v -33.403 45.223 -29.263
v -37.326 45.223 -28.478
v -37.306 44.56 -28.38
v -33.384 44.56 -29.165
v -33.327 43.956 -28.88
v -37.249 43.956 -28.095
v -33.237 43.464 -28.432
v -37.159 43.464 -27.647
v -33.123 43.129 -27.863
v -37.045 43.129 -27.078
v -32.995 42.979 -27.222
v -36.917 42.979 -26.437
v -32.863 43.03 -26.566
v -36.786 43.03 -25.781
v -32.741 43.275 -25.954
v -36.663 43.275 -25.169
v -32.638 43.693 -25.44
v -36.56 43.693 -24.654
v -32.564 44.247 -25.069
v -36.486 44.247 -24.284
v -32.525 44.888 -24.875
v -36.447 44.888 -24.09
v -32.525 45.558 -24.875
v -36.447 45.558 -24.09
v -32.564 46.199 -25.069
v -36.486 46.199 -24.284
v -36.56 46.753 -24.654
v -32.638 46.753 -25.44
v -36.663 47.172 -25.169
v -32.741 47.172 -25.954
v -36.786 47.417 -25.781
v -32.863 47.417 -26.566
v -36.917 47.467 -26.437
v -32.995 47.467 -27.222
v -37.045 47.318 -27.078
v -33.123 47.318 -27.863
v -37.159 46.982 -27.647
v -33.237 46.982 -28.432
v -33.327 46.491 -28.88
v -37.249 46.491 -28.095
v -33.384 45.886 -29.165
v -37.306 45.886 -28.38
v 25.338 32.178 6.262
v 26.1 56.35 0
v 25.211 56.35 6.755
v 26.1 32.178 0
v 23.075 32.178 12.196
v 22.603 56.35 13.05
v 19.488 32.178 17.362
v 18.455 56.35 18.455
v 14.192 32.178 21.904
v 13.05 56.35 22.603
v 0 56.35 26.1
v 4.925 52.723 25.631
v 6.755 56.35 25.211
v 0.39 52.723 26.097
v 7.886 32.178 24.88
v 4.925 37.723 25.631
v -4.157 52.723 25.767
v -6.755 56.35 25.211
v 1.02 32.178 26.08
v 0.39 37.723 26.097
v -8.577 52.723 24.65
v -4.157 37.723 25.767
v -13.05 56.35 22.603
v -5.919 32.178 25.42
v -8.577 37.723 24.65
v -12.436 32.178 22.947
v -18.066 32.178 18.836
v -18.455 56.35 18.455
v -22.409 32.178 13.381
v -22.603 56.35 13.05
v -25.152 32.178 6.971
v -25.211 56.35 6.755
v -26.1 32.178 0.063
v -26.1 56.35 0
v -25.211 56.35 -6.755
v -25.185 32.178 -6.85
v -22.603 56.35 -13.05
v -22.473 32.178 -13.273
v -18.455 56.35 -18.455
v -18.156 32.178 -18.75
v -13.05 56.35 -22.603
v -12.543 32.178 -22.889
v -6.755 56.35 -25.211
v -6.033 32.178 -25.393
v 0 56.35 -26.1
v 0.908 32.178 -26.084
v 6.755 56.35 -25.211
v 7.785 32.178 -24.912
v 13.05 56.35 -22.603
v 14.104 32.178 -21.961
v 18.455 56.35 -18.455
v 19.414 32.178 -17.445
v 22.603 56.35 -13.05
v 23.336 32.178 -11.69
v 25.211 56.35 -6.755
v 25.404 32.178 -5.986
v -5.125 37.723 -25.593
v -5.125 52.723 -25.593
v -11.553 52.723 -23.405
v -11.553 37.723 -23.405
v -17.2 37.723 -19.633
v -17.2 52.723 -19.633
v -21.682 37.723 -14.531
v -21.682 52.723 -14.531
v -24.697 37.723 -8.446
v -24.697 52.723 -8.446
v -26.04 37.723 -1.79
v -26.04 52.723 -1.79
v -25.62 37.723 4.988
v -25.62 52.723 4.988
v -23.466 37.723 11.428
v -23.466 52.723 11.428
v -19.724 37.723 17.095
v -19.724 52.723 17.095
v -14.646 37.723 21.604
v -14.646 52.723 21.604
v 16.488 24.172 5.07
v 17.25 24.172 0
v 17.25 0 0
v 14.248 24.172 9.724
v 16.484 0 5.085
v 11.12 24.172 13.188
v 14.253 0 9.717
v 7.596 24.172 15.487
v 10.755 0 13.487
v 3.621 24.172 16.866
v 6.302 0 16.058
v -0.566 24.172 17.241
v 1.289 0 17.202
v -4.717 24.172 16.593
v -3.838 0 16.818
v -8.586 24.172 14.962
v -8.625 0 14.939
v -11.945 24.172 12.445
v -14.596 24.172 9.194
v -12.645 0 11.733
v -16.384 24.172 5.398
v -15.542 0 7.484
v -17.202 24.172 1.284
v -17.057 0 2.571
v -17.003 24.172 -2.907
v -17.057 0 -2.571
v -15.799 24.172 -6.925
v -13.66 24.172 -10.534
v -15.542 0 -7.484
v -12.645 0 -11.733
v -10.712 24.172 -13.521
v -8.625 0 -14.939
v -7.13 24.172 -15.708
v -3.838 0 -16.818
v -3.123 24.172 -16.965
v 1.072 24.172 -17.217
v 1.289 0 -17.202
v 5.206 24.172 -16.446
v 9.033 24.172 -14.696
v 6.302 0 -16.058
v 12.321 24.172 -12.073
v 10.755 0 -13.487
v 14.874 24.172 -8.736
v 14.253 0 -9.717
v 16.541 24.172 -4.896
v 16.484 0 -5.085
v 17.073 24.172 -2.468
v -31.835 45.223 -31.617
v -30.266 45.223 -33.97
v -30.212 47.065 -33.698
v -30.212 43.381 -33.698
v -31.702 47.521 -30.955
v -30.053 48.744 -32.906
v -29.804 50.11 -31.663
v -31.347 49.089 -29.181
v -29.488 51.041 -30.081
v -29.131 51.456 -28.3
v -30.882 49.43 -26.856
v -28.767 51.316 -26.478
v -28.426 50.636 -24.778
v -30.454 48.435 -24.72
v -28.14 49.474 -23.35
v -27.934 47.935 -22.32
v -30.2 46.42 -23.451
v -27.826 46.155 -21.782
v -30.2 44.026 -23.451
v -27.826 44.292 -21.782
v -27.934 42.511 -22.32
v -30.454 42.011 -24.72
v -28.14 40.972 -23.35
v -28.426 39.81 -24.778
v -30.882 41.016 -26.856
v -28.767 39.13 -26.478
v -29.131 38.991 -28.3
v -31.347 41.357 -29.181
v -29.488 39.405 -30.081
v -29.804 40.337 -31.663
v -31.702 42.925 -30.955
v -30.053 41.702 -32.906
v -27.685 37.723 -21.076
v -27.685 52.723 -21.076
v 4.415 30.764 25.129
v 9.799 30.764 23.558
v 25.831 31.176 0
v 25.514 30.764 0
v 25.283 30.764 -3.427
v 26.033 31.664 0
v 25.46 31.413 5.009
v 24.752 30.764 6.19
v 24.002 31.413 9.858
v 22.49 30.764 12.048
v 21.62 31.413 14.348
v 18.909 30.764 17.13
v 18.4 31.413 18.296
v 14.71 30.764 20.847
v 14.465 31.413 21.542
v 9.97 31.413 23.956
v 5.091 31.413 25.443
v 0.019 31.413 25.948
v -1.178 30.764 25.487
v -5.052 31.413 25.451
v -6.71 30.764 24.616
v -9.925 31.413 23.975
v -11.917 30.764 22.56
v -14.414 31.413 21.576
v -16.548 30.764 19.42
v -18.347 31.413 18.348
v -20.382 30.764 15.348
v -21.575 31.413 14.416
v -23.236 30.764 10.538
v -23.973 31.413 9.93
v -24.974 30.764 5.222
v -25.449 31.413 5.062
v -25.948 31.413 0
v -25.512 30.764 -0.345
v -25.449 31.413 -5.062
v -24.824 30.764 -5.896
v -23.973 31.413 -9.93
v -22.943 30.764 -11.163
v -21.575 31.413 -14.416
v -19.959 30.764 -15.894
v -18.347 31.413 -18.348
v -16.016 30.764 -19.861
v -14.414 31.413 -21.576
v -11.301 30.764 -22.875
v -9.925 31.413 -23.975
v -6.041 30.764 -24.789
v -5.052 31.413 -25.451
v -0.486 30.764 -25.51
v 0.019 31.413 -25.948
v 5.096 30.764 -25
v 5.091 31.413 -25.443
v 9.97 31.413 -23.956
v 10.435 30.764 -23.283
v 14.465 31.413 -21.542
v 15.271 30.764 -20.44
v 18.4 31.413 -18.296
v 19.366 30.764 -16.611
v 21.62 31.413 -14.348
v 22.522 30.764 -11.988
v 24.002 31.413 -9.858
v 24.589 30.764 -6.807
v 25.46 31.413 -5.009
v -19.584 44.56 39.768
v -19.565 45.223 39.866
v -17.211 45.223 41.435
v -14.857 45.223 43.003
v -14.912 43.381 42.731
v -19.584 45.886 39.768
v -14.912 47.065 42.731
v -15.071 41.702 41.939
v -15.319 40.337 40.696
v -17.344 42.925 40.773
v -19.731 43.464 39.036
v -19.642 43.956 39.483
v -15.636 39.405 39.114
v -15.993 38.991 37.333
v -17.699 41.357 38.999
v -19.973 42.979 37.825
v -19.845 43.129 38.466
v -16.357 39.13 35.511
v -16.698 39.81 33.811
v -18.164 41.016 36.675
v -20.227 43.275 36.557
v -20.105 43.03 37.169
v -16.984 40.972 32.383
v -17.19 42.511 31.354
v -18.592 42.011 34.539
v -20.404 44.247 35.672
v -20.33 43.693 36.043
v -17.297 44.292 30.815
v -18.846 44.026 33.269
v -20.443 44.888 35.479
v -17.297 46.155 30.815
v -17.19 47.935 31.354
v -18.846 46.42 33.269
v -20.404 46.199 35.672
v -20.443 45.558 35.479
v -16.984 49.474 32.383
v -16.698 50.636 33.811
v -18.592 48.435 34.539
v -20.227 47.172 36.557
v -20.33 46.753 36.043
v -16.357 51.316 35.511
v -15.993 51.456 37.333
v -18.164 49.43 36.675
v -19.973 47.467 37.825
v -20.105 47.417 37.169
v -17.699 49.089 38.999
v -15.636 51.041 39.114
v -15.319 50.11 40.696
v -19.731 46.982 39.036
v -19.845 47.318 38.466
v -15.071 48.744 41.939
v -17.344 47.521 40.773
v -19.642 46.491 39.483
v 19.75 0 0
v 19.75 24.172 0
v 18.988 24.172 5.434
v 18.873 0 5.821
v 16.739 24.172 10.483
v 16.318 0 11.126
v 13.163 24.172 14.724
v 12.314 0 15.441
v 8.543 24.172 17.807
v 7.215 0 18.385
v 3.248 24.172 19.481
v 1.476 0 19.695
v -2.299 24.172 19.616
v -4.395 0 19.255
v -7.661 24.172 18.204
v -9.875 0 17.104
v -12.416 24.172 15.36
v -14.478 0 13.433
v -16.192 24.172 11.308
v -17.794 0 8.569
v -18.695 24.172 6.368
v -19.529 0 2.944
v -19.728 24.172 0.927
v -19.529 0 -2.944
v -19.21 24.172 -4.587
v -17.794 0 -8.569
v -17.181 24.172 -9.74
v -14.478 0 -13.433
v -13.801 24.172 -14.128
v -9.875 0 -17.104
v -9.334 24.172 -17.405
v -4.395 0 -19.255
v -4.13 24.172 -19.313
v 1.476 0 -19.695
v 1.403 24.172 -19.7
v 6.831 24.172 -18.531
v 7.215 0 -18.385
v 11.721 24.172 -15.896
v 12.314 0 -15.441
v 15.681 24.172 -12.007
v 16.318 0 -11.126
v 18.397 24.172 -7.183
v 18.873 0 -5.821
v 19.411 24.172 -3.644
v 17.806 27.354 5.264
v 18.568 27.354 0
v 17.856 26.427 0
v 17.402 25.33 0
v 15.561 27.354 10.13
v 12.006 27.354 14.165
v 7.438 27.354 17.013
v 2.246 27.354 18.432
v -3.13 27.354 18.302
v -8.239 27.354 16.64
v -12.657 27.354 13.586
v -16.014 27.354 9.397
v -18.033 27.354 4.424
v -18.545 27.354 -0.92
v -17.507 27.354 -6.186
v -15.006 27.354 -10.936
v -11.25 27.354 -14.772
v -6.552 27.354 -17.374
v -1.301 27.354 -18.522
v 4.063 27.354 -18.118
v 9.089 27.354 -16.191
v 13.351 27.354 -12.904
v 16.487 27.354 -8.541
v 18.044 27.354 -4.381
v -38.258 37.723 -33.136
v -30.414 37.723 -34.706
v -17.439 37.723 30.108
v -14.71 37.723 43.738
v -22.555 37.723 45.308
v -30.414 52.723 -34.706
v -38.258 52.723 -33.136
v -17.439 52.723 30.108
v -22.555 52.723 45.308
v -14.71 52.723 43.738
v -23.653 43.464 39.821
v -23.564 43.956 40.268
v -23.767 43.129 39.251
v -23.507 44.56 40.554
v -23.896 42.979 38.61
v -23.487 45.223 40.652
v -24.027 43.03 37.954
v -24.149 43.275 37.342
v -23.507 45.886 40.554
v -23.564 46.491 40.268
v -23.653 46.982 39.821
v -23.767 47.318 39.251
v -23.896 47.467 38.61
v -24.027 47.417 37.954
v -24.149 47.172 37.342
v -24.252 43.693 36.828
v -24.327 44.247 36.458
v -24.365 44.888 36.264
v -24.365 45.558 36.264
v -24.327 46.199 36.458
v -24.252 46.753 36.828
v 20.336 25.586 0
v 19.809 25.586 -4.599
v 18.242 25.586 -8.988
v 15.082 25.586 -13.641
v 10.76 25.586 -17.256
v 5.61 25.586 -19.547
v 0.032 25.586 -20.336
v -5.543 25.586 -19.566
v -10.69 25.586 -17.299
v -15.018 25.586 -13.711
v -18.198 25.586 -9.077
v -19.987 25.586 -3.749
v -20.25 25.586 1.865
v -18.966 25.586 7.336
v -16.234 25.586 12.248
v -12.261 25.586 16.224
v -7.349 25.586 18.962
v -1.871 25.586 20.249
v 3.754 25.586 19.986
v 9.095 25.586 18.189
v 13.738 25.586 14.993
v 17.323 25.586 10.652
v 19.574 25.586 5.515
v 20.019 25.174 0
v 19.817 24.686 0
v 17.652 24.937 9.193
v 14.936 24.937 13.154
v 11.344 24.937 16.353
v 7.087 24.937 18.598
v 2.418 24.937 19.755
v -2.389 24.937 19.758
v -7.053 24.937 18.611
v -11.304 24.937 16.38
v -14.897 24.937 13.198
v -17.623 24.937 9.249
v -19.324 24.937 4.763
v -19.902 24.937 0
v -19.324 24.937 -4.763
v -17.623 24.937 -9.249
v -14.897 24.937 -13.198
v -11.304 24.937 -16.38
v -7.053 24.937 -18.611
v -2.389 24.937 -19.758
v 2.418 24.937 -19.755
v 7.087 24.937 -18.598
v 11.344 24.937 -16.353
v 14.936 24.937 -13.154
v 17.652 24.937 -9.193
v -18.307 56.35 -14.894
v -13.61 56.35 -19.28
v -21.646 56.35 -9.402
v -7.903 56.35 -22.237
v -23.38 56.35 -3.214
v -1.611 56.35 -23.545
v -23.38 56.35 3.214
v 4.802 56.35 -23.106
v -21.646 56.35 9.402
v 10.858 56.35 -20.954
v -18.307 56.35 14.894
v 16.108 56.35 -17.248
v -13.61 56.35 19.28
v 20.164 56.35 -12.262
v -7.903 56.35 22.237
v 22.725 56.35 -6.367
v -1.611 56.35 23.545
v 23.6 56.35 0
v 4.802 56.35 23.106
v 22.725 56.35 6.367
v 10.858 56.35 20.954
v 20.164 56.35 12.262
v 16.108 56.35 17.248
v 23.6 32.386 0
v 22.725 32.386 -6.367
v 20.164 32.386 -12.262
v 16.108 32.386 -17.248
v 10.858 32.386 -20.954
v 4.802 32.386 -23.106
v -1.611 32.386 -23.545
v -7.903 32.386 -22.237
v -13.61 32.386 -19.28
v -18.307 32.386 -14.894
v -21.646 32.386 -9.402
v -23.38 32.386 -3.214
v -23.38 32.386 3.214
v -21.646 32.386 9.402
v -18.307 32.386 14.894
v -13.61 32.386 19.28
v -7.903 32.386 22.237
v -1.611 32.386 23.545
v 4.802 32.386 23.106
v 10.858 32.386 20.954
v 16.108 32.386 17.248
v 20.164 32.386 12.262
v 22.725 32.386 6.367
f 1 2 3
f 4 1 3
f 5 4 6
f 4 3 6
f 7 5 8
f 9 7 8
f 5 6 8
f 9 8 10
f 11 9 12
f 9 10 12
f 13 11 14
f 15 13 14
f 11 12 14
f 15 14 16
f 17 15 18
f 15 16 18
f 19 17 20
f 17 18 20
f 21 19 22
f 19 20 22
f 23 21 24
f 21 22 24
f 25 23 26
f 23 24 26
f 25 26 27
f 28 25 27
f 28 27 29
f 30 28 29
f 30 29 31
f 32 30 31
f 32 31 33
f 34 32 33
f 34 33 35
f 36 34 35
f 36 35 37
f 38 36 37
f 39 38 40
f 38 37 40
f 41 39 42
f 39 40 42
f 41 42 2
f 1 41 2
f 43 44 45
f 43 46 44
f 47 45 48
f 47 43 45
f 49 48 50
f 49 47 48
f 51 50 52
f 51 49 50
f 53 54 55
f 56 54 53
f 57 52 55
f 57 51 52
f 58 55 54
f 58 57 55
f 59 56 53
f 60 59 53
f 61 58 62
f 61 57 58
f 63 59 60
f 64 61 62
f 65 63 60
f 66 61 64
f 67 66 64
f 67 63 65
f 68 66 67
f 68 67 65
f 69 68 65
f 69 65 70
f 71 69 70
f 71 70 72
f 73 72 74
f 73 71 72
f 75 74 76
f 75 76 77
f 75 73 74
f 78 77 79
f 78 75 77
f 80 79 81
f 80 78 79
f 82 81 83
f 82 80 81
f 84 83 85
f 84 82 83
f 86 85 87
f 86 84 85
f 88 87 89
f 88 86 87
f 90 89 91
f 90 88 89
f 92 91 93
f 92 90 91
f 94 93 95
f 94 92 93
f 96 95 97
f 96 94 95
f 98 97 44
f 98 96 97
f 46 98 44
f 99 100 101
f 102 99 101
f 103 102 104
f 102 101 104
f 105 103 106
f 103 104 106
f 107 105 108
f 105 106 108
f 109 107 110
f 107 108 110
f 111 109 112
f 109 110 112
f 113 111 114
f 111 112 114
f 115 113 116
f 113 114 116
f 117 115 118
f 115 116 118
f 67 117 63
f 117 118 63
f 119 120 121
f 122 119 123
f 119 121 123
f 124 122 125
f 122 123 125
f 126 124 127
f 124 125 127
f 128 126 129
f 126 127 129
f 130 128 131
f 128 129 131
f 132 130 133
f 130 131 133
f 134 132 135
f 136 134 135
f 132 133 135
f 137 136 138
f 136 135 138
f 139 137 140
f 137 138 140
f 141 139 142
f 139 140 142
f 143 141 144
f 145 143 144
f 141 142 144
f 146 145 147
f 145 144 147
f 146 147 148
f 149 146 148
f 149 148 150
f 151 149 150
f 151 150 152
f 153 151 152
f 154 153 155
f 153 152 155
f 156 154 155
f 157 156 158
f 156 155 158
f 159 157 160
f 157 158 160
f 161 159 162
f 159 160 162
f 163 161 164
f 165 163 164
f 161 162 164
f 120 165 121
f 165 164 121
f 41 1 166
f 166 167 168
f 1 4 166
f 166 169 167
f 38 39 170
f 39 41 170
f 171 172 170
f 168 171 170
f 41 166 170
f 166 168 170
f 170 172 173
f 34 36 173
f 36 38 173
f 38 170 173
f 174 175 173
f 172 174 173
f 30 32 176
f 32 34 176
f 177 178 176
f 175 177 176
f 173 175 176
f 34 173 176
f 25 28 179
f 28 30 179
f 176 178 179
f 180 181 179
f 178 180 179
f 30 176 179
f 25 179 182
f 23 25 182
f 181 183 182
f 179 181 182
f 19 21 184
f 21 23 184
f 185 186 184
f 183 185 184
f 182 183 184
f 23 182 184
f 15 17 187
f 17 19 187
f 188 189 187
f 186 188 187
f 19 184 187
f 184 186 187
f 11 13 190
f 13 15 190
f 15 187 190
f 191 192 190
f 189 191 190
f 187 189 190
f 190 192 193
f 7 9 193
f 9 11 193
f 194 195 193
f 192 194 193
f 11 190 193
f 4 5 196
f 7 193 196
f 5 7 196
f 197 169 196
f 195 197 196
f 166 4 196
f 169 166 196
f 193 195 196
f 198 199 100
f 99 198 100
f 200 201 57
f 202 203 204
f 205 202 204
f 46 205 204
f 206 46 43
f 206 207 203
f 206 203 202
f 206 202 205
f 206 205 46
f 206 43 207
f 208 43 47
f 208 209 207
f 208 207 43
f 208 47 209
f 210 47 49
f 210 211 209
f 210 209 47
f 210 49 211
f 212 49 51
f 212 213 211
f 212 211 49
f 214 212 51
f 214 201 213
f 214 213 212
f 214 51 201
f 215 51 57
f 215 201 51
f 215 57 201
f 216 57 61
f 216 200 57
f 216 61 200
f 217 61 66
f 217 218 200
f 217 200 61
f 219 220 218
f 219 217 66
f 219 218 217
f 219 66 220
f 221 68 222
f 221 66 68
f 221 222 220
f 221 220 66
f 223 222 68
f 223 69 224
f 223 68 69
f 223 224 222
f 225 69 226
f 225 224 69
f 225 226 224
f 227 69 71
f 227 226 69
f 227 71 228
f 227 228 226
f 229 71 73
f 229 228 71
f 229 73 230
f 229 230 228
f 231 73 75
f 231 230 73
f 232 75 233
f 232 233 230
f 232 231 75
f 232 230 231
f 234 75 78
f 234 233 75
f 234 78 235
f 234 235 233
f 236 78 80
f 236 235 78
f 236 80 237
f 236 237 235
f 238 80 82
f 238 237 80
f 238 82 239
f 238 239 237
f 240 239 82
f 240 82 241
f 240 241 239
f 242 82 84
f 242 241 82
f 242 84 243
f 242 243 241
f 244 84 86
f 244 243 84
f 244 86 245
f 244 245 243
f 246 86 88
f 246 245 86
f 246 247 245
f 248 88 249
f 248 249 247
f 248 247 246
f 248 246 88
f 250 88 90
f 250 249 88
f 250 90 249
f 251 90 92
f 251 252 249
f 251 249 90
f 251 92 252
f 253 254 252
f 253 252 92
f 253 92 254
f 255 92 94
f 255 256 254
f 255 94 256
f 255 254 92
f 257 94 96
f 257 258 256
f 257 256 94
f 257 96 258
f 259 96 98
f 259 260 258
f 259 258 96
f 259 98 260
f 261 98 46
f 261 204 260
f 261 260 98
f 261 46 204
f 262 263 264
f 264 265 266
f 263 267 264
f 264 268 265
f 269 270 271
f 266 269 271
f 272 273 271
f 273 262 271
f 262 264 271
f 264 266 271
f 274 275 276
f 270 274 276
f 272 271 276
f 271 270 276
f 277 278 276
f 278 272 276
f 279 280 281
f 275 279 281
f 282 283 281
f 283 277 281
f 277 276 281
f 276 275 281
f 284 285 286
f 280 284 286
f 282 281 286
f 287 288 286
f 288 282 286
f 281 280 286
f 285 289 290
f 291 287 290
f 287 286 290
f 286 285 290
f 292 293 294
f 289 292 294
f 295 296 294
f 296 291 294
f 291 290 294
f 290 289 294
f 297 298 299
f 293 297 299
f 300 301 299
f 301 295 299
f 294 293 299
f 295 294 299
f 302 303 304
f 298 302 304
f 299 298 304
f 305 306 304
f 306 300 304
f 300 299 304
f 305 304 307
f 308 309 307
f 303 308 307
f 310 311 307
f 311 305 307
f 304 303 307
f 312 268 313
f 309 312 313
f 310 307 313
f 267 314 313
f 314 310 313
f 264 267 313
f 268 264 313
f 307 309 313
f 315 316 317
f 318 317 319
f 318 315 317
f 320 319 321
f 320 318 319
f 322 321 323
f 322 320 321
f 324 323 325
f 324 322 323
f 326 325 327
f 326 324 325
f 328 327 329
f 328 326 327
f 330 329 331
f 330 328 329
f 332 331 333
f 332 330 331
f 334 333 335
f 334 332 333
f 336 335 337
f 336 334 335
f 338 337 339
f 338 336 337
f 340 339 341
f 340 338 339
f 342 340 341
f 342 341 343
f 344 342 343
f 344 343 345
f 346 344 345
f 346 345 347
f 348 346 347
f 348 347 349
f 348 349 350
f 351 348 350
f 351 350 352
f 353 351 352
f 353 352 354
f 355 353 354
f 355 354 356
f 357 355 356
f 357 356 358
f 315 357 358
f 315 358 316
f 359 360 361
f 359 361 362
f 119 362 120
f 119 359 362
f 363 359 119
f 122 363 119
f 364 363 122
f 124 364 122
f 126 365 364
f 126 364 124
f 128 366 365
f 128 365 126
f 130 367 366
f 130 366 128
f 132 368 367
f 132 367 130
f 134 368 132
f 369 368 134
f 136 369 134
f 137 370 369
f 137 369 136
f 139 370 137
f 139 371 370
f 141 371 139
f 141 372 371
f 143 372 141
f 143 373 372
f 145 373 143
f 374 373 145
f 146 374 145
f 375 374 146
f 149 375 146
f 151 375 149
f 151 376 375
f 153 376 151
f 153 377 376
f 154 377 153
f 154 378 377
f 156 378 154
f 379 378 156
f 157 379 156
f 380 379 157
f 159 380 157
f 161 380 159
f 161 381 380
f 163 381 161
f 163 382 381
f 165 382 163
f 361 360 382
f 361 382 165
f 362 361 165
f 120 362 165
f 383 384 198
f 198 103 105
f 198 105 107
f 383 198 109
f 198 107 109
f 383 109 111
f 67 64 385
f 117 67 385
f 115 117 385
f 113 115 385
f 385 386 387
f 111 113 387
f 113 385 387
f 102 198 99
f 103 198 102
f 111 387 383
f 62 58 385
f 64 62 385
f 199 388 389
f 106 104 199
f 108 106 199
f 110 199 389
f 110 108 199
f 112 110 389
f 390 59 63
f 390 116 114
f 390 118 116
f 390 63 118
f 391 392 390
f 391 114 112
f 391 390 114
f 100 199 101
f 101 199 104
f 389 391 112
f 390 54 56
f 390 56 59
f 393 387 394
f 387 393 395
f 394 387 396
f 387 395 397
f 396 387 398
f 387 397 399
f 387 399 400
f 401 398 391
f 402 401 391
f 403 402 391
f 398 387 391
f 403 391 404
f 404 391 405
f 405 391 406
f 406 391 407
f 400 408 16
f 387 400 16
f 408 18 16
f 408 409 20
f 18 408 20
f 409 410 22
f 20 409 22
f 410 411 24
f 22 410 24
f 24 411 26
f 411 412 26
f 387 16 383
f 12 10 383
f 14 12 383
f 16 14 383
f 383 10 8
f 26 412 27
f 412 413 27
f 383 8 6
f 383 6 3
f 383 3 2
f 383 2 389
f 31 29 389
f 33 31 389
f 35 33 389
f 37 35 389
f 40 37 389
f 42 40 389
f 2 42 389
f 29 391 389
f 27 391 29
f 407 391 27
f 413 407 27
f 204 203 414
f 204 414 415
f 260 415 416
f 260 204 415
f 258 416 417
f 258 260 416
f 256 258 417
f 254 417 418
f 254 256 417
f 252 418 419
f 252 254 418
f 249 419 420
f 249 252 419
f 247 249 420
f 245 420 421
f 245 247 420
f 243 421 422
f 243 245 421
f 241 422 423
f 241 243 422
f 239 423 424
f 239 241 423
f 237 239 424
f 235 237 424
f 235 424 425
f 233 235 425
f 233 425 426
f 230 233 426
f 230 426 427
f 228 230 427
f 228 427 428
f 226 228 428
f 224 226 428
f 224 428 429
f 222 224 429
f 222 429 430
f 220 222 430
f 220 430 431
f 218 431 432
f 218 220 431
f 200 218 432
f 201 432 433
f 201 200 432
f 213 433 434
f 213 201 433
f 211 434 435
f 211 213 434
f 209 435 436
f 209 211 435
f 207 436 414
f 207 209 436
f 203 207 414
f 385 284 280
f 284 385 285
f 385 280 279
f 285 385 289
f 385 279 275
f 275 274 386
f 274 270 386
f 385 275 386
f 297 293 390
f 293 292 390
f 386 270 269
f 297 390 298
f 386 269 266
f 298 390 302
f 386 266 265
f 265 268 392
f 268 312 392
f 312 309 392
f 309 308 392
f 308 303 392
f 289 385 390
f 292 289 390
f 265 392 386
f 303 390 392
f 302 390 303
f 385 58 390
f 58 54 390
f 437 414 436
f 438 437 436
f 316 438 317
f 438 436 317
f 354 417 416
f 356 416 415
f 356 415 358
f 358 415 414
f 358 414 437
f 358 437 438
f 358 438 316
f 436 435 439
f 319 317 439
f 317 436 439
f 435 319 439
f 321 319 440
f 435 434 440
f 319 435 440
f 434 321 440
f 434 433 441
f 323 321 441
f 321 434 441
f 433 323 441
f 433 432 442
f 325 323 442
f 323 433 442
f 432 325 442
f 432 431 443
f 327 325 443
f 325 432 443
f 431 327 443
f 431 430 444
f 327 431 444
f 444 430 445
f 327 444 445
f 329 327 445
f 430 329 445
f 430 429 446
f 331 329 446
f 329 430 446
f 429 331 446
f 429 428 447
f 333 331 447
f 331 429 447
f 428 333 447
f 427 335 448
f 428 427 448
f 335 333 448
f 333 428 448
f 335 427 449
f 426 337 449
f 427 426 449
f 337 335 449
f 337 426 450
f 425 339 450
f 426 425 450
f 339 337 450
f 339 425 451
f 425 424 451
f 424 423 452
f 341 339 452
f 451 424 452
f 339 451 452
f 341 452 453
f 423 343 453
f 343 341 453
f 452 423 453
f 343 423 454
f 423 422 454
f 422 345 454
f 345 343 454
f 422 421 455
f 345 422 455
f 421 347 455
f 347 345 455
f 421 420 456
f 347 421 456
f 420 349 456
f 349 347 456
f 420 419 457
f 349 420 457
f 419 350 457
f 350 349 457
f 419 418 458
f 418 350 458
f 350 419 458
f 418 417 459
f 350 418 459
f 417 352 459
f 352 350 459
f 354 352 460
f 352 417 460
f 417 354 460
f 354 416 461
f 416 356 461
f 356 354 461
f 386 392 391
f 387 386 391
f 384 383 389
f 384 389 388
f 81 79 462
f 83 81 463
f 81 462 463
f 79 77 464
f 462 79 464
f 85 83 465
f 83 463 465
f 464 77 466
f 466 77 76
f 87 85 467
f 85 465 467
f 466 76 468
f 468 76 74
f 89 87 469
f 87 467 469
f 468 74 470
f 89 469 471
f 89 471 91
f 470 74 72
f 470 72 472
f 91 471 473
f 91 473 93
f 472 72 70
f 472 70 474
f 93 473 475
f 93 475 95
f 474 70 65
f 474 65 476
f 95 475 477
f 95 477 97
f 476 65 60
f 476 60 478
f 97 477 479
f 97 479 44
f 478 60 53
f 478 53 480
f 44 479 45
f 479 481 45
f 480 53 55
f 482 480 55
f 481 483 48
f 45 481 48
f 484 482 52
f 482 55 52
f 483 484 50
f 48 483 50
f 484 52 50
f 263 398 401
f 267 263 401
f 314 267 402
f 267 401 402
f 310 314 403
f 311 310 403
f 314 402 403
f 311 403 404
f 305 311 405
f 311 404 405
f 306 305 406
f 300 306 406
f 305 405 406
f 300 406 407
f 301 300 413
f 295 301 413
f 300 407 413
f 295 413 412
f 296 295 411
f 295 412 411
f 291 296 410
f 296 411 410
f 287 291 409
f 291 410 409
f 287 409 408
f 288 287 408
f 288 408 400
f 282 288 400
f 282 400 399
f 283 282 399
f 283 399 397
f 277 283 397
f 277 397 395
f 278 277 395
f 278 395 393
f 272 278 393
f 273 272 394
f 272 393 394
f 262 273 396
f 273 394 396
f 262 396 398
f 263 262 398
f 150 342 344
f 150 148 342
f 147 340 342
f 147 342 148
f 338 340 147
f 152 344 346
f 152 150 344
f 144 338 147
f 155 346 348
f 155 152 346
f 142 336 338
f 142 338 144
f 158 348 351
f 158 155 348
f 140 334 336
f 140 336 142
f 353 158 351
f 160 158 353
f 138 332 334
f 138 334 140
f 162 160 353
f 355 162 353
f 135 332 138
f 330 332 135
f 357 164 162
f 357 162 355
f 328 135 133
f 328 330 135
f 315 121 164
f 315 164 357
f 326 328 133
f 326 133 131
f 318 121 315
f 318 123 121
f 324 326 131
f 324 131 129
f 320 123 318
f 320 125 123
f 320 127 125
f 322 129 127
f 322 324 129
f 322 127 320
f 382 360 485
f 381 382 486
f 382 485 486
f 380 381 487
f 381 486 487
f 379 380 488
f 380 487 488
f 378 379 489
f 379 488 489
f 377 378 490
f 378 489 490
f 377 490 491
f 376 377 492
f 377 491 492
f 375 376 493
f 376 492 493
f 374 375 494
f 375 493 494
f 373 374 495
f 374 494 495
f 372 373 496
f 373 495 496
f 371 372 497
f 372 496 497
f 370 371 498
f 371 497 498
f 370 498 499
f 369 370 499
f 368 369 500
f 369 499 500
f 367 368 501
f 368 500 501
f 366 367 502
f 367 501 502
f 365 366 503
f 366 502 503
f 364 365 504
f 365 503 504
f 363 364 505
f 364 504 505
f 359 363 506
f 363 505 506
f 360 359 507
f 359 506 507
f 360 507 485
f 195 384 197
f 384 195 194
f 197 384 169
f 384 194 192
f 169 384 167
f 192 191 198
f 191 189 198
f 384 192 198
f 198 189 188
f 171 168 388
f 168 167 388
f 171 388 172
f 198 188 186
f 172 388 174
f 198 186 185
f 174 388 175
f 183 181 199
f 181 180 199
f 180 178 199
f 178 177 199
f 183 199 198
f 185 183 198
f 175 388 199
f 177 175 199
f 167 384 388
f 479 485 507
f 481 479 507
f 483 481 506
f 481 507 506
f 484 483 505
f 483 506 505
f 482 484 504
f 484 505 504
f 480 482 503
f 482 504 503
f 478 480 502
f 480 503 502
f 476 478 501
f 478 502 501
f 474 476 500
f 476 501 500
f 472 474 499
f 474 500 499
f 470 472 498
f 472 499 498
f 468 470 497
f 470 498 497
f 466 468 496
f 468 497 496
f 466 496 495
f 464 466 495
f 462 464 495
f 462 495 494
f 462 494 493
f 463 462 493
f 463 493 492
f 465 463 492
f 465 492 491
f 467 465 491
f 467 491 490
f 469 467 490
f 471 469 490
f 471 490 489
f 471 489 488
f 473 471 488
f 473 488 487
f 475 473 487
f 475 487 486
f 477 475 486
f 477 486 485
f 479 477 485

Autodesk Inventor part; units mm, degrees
ref_plane "YZ Plane" through (0, 0, 0) normal (1, 0, 0) x (0, 1, 0)
ref_plane "XZ Plane" through (0, 0, 0) normal (0, 1, 0) x (-1, 0, 0)
ref_plane "XY Plane" through (0, 0, 0) normal (0, 0, 1) x (1, 0, 0)
sketch "Sketch1" plane through (0, 0, 0) normal (0, 0, 1) x (1, 0, 0)
  line L0 (0, 0) -> (0, 56.35)
  line L1 (0, 56.35) -> (26.1, 56.35)
  line L2 (26.1, 56.35) -> (26.1, 31.35)
  line L3 (26.1, 31.35) -> (19.75, 25)
  line L4 (19.75, 25) -> (19.75, 0)
  line L5 (19.75, 0) -> (0, 0)
  dimension "d1" = 39.5
  dimension "d3" = 45
  dimension "d5" = 52.2
  dimension "d6" = 25
revolve "Revolution1" add sketch "Sketch1" angle 360 about axis through (0, 0, 0) along (0, -1, 0)
fillet "Fillet2" radius 2 1 edges at (-19.75, 25, 0)
fillet "Fillet3" radius 2 1 edges at (-26.1, 31.35, 0)
shell "Shell2" thickness 2.5 removed faces 2 at (7.4507, 56.35, 1.961) at (5.8293, 0, 3.0594)
ref_plane "Work Plane4" through (-19.7215, 58.7231, 59.4617) normal (0, 1, 0) x (-0.9806, 0, 0.1963)
ref_plane "Work Plane2" through (-19.7215, 0.4561, 59.4617) normal (0, 1, 0) x (-0.9806, 0, 0.1963)
ref_plane "Work Plane5" through (-19.7215, 52.7231, 59.4617) normal (0, 1, 0) x (-0.9806, 0, 0.1963)
sketch "Sketch5" plane through (-19.7215, 52.7231, 59.4617) normal (0, 1, 0) x (-0.9806, 0, 0.1963)
  circle A0 centre (-31.0082, -54.4346) radius 26.1 projected
  line L0 (-8, -28.3346) -> (-8, -14.4346)
  line L1 (-8, -14.4346) -> (0, -14.4346)
  line L2 (0, -14.4346) -> (0, -94.4346)
  line L3 (0, -94.4346) -> (-8, -94.4346)
  line L4 (0, 0) -> (0, -15) projected
  line L5 (-8, -94.4346) -> (-8, -80.5346)
  line L6 (-8, -80.5346) -> (-31.0082, -80.5346)
  line L7 (-31.0082, -28.3346) -> (-8, -28.3346)
  point P0 (-31.0082, -54.4346)
  dimension "d20" = 40
  dimension "d21" = 40
  dimension "d22" = 8
extrude "Extrusion2" add sketch "Sketch5" against normal blind 15 contours A0 L7 L0 L1 L2 L3 L5 L6
sketch "Sketch6" plane through (-27.6833, 37.7231, -21.0766) normal (0.9806, 0, -0.1963) x (-0.1963, 0, -0.9806)
  point P0 (-26.1, -37.7231)
ref_plane "Work Plane6" through (0, 43.85, 0) normal (-0.1963, 0, -0.9806) x (0, -1, 0)
sketch "Sketch7" plane through (-27.6833, 37.7231, -21.0766) normal (0.9806, 0, -0.1963) x (-0.1963, 0, -0.9806)
  line L0 (0, 15) -> (13.9, 15) projected
  line L1 (13.9, 15) -> (13.9, 0) projected
  point P0 (-26.1, -37.7231)
  point P1 (6.9, 7.5)
  dimension "d27" = 7.5
  dimension "d35" = 7
hole "Hole1" at (-29.0375, 45.2231, -27.8424) direction (-0.9806, 0, 0.1963) diameter 4.5 end through all
mirror "Mirror1" about plane through (0, 43.85, 0) normal (-0.1963, 0, -0.9806) of "Hole1"
chamfer "Chamfer2" distance 4 angle 45 2 edges at (-28.5959, 45.2231, -25.6362) (-16.5256, 45.2231, 34.6677)
properties part number "_3DPrint"
